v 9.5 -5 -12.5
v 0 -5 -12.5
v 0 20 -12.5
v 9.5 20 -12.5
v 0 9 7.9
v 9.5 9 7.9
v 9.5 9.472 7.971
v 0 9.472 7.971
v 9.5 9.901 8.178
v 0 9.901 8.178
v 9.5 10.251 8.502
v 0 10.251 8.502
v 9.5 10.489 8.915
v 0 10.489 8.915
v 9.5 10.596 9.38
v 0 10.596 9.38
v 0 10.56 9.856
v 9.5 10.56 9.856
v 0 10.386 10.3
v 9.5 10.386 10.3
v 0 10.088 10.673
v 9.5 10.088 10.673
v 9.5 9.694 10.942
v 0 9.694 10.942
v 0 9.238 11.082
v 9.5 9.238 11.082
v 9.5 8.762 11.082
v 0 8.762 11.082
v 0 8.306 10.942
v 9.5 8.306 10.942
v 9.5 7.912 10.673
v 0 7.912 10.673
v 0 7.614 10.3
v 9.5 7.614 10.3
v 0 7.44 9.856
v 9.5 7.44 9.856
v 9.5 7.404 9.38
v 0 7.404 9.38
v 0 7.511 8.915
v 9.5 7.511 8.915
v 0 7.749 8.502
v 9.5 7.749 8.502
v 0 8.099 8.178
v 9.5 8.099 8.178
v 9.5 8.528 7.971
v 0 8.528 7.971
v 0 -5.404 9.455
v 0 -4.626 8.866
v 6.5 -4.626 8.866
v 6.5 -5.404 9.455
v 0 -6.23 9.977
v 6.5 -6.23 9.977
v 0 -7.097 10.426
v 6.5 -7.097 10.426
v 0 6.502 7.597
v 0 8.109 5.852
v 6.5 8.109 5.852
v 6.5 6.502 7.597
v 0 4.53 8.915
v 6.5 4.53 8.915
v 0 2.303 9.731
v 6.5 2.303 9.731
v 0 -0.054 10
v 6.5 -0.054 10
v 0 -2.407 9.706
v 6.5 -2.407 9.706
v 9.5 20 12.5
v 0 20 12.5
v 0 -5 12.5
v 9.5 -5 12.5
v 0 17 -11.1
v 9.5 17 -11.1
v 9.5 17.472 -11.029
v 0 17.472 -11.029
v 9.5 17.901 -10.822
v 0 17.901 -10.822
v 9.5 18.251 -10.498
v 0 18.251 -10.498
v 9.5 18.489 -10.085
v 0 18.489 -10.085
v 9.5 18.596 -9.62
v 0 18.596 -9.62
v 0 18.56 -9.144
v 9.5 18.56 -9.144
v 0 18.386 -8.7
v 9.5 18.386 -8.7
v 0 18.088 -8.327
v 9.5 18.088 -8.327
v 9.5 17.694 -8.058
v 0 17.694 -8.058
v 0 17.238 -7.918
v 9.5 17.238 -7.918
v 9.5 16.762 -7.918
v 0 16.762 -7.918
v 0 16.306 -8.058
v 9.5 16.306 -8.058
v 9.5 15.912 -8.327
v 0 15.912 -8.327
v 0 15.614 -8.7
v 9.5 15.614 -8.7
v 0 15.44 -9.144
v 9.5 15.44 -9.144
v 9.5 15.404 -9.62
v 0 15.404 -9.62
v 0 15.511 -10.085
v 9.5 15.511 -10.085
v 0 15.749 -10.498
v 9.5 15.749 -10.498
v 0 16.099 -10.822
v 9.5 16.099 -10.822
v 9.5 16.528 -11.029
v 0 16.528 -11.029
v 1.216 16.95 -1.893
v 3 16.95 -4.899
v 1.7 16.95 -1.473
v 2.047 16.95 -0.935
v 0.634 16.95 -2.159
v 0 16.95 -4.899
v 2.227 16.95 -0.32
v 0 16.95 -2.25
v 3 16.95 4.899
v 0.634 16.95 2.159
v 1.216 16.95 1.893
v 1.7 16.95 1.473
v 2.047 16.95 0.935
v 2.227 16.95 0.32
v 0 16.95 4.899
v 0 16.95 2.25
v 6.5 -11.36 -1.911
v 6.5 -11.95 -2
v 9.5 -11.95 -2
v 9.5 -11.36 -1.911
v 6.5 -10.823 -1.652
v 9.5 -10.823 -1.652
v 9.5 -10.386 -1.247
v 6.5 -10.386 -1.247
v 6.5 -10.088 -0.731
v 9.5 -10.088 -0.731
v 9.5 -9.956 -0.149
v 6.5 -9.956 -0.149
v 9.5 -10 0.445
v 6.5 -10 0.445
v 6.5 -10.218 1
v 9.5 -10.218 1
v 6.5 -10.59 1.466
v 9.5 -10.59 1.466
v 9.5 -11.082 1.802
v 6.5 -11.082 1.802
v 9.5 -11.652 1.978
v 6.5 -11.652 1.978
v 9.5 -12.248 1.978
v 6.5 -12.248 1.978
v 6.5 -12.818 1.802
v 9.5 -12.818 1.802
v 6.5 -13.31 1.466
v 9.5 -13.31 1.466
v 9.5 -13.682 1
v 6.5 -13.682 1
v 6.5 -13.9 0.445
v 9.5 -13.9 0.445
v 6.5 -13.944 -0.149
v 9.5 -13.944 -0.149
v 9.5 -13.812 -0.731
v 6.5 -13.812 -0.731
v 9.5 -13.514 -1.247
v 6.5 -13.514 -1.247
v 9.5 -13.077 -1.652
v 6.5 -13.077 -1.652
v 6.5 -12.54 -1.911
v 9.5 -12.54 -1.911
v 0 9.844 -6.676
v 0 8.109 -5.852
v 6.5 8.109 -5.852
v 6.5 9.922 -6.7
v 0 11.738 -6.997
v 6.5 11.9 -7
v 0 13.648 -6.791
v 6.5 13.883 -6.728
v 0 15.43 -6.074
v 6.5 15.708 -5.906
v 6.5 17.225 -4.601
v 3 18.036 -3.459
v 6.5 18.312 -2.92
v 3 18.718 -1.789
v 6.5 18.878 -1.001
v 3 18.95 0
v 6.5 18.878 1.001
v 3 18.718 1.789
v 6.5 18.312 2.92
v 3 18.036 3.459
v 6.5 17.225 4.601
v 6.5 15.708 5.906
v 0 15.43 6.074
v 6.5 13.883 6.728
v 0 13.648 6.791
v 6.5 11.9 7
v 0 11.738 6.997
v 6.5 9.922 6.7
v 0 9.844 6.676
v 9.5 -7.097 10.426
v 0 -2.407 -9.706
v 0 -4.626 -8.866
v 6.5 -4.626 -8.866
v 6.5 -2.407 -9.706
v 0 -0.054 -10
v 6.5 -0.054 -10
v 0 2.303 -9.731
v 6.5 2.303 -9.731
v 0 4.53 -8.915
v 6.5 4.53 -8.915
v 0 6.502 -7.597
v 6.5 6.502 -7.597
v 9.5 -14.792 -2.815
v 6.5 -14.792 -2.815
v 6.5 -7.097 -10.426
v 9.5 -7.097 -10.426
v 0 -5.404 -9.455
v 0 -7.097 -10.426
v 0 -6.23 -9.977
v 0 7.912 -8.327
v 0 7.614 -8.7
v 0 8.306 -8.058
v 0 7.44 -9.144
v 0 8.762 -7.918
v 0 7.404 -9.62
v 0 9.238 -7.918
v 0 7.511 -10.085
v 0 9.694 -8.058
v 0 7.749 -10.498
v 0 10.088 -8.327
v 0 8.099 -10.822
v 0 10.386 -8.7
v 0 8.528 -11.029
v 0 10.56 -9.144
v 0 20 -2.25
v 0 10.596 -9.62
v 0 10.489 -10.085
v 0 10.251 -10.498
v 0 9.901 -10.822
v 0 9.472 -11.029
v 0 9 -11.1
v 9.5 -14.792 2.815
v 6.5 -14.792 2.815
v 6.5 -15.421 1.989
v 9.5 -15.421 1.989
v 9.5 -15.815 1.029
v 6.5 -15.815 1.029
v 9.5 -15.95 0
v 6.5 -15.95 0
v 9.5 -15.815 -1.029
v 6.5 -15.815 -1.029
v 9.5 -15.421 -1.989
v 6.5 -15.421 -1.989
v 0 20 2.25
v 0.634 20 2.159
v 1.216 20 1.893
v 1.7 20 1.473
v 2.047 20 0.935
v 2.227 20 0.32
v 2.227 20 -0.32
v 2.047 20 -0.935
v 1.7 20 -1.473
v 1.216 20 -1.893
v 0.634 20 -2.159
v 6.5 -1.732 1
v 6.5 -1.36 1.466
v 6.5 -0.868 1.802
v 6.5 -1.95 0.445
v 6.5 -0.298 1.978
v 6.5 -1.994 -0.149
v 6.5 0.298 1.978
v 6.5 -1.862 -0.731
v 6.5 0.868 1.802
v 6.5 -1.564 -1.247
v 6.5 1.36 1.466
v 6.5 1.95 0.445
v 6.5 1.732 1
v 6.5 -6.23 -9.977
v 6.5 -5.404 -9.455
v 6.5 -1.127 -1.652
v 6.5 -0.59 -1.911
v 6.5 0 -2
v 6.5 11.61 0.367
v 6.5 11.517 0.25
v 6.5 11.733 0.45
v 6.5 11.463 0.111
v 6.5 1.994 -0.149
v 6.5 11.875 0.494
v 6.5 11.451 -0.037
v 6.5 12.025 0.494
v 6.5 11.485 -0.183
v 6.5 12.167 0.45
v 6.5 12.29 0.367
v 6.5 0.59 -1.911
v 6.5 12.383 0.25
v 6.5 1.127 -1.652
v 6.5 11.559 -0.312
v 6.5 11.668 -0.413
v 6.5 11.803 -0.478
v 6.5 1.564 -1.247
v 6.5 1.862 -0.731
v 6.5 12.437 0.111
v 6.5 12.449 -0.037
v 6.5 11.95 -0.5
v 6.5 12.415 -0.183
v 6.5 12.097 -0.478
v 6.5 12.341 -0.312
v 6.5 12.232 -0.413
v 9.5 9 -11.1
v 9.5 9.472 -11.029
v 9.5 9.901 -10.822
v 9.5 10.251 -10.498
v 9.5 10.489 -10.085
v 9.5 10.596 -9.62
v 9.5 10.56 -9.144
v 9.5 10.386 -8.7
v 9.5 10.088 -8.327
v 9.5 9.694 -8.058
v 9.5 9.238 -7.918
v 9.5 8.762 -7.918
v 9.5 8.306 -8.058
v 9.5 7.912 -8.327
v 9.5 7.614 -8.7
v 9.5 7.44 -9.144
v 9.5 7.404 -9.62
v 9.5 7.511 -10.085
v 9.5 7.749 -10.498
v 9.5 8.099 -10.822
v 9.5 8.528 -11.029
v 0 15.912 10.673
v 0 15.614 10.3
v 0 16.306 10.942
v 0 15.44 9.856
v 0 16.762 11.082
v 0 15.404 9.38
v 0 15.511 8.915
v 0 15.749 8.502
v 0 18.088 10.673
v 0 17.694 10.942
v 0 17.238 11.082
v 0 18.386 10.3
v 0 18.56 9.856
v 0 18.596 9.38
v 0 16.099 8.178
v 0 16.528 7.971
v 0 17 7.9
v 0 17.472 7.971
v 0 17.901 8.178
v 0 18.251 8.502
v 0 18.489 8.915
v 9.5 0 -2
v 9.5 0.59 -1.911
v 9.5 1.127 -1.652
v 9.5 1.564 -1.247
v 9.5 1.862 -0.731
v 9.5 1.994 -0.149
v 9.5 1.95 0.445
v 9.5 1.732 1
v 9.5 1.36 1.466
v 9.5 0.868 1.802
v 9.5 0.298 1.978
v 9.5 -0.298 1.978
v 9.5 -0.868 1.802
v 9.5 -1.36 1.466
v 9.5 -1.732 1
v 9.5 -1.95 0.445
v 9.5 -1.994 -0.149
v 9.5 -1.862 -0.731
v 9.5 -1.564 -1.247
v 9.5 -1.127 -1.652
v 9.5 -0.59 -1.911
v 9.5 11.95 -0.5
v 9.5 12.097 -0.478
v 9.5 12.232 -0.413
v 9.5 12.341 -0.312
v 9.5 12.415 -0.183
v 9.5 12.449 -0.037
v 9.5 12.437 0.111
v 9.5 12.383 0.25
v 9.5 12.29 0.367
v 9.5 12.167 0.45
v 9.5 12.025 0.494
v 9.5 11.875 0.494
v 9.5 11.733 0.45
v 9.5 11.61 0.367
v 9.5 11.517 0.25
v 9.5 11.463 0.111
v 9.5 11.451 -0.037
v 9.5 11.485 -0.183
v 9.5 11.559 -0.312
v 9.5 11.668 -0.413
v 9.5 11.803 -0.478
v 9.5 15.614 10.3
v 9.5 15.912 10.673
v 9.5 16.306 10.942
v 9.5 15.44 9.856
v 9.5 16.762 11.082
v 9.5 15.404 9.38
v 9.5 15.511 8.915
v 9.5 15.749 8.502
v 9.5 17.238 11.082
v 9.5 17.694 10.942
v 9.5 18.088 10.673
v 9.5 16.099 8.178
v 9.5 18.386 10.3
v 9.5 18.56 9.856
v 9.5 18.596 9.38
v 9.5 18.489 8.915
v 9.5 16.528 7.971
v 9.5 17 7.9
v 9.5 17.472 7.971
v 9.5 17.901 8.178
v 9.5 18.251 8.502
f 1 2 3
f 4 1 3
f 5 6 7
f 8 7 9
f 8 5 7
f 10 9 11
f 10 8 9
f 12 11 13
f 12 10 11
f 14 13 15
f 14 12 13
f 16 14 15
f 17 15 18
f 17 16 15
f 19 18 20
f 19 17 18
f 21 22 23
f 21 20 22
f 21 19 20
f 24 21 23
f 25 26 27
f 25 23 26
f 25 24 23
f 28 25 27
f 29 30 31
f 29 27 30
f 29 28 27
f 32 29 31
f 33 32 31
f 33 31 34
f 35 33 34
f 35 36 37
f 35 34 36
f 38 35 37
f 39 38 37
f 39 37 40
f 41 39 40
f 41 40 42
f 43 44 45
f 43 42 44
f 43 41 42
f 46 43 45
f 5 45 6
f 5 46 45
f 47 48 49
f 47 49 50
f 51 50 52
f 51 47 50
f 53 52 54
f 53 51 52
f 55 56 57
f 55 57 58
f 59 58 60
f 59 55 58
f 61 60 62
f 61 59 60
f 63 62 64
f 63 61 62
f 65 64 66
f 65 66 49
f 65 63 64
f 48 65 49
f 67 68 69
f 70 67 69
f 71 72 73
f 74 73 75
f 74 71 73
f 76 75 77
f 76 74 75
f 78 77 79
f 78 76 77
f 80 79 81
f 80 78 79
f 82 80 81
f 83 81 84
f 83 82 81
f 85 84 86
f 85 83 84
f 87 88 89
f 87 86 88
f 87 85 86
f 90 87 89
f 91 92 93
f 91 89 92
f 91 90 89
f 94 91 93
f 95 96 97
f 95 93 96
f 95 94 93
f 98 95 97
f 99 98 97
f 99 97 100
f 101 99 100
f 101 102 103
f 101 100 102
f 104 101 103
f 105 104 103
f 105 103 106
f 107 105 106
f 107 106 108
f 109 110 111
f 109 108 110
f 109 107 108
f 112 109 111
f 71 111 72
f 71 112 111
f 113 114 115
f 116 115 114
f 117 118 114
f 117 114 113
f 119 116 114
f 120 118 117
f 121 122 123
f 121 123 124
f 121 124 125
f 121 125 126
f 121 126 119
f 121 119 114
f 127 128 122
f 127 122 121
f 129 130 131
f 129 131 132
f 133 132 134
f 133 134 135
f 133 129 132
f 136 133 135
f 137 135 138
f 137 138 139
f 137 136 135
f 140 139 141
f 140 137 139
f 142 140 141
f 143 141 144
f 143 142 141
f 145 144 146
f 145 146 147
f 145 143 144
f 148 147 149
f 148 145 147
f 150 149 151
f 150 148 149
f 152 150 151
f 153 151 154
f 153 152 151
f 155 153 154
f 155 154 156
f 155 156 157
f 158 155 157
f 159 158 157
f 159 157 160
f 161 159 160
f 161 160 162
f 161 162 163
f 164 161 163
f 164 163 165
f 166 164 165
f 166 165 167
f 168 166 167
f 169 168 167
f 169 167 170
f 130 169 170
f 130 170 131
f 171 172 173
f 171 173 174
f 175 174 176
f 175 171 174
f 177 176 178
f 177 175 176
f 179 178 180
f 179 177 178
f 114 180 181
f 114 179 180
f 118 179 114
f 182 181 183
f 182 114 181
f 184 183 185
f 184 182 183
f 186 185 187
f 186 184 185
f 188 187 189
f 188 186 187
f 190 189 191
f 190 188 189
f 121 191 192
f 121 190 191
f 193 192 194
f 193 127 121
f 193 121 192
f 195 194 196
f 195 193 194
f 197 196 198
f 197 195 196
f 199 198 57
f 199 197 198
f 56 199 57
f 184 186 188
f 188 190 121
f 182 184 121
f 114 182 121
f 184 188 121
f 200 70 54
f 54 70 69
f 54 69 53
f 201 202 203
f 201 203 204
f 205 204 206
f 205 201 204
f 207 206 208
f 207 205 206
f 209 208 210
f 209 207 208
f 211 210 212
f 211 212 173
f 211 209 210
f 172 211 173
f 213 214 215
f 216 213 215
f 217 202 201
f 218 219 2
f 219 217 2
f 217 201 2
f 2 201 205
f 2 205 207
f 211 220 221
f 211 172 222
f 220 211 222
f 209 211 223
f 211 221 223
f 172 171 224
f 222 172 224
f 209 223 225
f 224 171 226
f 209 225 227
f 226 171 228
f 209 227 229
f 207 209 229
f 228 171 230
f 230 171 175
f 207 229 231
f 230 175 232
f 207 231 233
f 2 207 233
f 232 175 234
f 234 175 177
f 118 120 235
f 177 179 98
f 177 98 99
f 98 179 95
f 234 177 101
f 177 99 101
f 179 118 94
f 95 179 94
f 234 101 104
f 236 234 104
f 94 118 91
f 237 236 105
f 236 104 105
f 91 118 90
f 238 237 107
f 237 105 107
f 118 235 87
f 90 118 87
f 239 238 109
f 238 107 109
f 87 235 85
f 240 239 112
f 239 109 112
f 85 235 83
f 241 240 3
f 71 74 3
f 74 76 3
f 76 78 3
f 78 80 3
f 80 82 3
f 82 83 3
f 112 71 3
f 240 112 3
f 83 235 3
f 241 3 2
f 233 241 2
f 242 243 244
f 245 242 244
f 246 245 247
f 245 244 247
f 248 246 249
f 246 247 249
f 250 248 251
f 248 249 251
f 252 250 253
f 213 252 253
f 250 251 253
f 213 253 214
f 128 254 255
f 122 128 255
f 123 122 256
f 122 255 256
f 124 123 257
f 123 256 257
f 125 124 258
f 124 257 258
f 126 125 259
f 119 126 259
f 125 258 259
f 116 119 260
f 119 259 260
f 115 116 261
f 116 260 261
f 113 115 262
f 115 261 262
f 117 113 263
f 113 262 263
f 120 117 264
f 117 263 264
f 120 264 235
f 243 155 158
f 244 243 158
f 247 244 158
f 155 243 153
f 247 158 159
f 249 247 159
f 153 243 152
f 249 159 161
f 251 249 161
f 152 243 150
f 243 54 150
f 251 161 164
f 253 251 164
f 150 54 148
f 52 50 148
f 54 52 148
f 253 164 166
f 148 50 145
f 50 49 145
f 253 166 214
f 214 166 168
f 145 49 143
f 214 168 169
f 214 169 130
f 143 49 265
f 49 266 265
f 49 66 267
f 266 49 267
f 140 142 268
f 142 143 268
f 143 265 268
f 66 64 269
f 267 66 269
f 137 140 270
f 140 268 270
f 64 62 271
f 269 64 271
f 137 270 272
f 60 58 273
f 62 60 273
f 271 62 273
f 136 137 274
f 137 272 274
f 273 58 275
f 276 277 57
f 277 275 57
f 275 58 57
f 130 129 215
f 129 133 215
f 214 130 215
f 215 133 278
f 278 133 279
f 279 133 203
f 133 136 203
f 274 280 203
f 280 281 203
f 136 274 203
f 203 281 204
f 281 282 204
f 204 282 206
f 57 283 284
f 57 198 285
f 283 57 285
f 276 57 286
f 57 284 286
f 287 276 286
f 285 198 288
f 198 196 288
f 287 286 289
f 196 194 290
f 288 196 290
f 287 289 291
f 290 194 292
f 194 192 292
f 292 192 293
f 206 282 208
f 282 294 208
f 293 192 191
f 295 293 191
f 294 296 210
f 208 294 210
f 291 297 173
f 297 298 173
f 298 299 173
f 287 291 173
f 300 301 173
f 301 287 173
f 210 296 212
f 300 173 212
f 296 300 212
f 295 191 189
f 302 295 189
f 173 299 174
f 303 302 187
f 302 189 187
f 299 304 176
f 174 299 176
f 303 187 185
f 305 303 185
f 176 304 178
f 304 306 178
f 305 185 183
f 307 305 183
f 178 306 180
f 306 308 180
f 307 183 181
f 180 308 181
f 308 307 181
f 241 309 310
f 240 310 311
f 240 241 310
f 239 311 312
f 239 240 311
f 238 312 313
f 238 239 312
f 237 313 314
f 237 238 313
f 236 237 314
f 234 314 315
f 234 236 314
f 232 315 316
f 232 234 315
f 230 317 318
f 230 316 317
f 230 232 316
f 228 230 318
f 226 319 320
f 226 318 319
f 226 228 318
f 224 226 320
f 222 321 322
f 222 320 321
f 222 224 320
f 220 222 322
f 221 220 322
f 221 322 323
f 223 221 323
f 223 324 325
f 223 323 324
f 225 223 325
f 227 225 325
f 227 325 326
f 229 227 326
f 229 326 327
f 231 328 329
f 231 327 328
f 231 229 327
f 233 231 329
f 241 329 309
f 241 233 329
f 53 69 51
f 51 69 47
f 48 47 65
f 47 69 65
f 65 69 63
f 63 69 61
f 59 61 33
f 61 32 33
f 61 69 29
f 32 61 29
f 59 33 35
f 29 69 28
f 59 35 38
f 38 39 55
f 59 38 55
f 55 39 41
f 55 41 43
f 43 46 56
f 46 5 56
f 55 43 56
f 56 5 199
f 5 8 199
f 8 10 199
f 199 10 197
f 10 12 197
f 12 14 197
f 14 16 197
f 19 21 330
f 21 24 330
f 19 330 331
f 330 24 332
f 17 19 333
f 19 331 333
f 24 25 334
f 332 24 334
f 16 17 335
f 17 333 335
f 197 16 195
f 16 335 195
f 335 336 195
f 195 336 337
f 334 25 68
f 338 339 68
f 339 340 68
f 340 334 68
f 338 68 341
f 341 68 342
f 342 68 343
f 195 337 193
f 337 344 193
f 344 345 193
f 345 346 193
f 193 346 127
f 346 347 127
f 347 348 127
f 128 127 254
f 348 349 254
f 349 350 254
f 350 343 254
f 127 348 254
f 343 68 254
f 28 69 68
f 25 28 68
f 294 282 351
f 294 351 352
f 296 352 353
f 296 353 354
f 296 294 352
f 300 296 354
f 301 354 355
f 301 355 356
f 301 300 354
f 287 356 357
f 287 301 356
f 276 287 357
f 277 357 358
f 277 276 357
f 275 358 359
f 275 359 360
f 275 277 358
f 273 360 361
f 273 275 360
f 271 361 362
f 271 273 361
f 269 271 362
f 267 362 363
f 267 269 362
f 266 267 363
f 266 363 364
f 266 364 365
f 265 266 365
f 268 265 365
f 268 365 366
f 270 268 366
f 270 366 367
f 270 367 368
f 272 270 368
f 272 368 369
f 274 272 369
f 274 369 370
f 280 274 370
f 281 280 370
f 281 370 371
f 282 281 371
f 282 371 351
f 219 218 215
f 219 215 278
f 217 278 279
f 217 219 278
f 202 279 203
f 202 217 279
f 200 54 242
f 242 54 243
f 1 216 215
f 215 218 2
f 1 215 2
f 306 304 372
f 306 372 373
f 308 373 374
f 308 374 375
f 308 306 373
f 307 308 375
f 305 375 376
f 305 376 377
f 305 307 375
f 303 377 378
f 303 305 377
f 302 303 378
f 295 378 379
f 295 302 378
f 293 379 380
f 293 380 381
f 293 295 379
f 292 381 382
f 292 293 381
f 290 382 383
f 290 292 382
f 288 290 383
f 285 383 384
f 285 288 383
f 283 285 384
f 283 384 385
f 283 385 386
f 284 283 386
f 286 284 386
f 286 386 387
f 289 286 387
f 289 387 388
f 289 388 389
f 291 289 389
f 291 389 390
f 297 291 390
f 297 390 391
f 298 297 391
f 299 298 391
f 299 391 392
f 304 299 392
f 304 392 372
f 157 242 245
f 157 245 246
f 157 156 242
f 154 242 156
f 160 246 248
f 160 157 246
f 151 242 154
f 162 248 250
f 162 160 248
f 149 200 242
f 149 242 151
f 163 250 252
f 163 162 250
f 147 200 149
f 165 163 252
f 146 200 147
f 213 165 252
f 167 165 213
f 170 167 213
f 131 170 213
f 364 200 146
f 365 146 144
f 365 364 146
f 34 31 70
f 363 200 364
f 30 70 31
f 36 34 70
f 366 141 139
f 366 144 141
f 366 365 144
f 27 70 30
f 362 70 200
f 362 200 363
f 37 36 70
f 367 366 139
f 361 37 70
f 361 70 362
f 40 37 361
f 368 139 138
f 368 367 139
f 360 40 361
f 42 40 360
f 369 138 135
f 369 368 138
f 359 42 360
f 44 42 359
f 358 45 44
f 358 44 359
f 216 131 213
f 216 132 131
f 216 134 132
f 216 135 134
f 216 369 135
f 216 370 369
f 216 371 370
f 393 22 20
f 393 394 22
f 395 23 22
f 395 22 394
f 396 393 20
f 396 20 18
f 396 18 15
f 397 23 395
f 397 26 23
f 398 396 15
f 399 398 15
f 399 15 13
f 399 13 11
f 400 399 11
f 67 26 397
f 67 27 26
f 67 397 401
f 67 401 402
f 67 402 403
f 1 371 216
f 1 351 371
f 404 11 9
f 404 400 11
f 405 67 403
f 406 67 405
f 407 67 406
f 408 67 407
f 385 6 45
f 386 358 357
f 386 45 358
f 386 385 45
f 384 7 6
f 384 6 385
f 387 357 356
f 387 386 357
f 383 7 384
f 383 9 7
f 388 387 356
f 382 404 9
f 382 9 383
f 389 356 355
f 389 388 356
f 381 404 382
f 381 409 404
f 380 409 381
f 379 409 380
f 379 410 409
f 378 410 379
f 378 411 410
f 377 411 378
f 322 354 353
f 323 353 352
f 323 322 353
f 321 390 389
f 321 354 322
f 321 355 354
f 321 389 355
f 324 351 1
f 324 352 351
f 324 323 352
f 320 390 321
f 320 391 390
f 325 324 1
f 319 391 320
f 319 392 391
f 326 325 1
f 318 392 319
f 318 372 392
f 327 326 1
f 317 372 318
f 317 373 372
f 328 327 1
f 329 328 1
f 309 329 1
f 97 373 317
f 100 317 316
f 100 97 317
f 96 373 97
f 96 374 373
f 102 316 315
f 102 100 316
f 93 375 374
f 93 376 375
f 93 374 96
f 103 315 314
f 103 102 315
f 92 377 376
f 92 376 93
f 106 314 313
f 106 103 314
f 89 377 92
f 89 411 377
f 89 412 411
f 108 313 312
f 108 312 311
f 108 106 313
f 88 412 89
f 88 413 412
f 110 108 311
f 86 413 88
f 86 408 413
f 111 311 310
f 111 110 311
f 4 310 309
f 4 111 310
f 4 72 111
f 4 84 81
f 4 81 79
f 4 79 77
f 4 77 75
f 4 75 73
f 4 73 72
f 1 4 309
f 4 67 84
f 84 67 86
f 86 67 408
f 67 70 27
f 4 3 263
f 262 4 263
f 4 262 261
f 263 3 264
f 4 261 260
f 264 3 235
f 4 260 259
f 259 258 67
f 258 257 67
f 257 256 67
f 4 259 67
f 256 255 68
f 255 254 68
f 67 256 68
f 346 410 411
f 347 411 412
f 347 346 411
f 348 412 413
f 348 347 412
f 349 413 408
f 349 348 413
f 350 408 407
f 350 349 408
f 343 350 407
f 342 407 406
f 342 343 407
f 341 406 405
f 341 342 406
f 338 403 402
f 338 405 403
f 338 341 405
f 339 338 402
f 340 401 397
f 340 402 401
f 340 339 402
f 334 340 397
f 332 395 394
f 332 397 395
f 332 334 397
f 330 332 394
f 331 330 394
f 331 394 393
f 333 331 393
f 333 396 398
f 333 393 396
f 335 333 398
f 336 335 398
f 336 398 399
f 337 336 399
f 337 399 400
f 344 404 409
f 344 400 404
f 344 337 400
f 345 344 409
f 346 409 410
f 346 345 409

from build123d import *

# Parameters (mm, degrees)
SKETCH1_R           = 2
SKETCH1_R_2         = 0.5
BOSS_EXTRUDE1_DEPTH = 9.5
SKETCH1_3_R         = 2
SKETCH1_3_R_2       = 0.5
CUT_EXTRUDE1_DEPTH  = 6.5
BOSS_EXTRUDE2_DEPTH = 3
CUT_EXTRUDE2_START  = 20
SKETCH3_R           = 2.25
CUT_EXTRUDE2_DEPTH  = 6
SKETCH5_R           = 1.6
CUT_EXTRUDE3_DEPTH  = 10


with BuildPart() as part:
    # Sketch1 → Boss-Extrude1 (new body)
    with BuildSketch(Plane(origin=(0, 0, 0), x_dir=(0, 0, -1), z_dir=(1, 0, 0))):
        with BuildLine():
            Line((2.814717913, -14.792070209), (10.42585747, -7.09701164))
            ThreePointArc((10.42585747, -7.09701164), (9.72468907, -5.811561885), (8.865865393, -4.625627615))
            ThreePointArc((8.865865393, -4.625627615), (9.731180291, 2.303069722), (5.85199823, 8.108891213))
            ThreePointArc((5.85199823, 8.108891213), (0, 18.95), (-5.85199823, 8.108891213))
            ThreePointArc((-5.85199823, 8.108891213), (-9.731180291, 2.303069722), (-8.865865393, -4.625627615))
            ThreePointArc((-8.865865393, -4.625627615), (-9.72468907, -5.811561885), (-10.42585747, -7.09701164))
            Line((-10.42585747, -7.09701164), (-2.814717913, -14.792070209))
            ThreePointArc((-2.814717913, -14.792070209), (0, -15.95), (2.814717913, -14.792070209))
        make_face()
        with Locations((0, -11.95)):
            Circle(SKETCH1_R, mode=Mode.SUBTRACT)
        Circle(SKETCH1_R, mode=Mode.SUBTRACT)
        with Locations((0, 11.95)):
            Circle(SKETCH1_R_2, mode=Mode.SUBTRACT)
        with BuildLine():
            Line((10.42585747, -7.09701164), (12.5, -5))
            Line((12.5, -5), (12.5, 20))
            Line((12.5, 20), (-12.5, 20))
            Line((-12.5, 20), (-12.5, -5))
            Line((-12.5, -5), (-10.42585747, -7.09701164))
            ThreePointArc((-10.42585747, -7.09701164), (-9.72468907, -5.811561885), (-8.865865393, -4.625627615))
            ThreePointArc((-8.865865393, -4.625627615), (-9.731180291, 2.303069722), (-5.85199823, 8.108891213))
            ThreePointArc((-5.85199823, 8.108891213), (0, 18.95), (5.85199823, 8.108891213))
            ThreePointArc((5.85199823, 8.108891213), (9.731180291, 2.303069722), (8.865865393, -4.625627615))
            ThreePointArc((8.865865393, -4.625627615), (9.72468907, -5.811561885), (10.42585747, -7.09701164))
        make_face()
    extrude(amount=BOSS_EXTRUDE1_DEPTH)

    # Sketch1<3> → Cut-Extrude1 (cut)
    with BuildSketch(Plane(origin=(0, 0, 0), x_dir=(0, 0, -1), z_dir=(1, 0, 0))):
        with BuildLine():
            Line((2.814717913, -14.792070209), (10.42585747, -7.09701164))
            ThreePointArc((10.42585747, -7.09701164), (9.72468907, -5.811561885), (8.865865393, -4.625627615))
            ThreePointArc((8.865865393, -4.625627615), (9.731180291, 2.303069722), (5.85199823, 8.108891213))
            ThreePointArc((5.85199823, 8.108891213), (0, 18.95), (-5.85199823, 8.108891213))
            ThreePointArc((-5.85199823, 8.108891213), (-9.731180291, 2.303069722), (-8.865865393, -4.625627615))
            ThreePointArc((-8.865865393, -4.625627615), (-9.72468907, -5.811561885), (-10.42585747, -7.09701164))
            Line((-10.42585747, -7.09701164), (-2.814717913, -14.792070209))
            ThreePointArc((-2.814717913, -14.792070209), (0, -15.95), (2.814717913, -14.792070209))
        make_face()
        with Locations((0, -11.95)):
            Circle(SKETCH1_3_R, mode=Mode.SUBTRACT)
        Circle(SKETCH1_3_R, mode=Mode.SUBTRACT)
        with Locations((0, 11.95)):
            Circle(SKETCH1_3_R_2, mode=Mode.SUBTRACT)
    extrude(amount=CUT_EXTRUDE1_DEPTH, mode=Mode.SUBTRACT)

    # Sketch4 → Boss-Extrude2 (add)
    with BuildSketch(Plane(origin=(0, 0, 0), x_dir=(0, 0, -1), z_dir=(1, 0, 0))):
        with BuildLine():
            Line((4.898979486, 16.95), (-4.898979486, 16.95))
            ThreePointArc((-4.898979486, 16.95), (0, 18.95), (4.898979486, 16.95))
        make_face()
    extrude(amount=BOSS_EXTRUDE2_DEPTH)

    # Sketch3 → Cut-Extrude2 (cut)
    with BuildSketch(Plane(origin=(0, 0, 0), x_dir=(1, 0, 0), z_dir=(0, 1, 0)).offset(CUT_EXTRUDE2_START)):
        Circle(SKETCH3_R)
    extrude(amount=-CUT_EXTRUDE2_DEPTH, mode=Mode.SUBTRACT)

    # Sketch5 → Cut-Extrude3 (cut)
    with BuildSketch(Plane(origin=(0, 0, 0), x_dir=(0, 0, -1), z_dir=(1, 0, 0))):
        with Locations((9.5, 9)):
            Circle(SKETCH5_R)
        with Locations((-9.5, 9)):
            Circle(SKETCH5_R)
        with Locations((-9.5, 17)):
            Circle(SKETCH5_R)
        with Locations((9.5, 17)):
            Circle(SKETCH5_R)
    extrude(amount=CUT_EXTRUDE3_DEPTH, mode=Mode.SUBTRACT)


solid = part.part
